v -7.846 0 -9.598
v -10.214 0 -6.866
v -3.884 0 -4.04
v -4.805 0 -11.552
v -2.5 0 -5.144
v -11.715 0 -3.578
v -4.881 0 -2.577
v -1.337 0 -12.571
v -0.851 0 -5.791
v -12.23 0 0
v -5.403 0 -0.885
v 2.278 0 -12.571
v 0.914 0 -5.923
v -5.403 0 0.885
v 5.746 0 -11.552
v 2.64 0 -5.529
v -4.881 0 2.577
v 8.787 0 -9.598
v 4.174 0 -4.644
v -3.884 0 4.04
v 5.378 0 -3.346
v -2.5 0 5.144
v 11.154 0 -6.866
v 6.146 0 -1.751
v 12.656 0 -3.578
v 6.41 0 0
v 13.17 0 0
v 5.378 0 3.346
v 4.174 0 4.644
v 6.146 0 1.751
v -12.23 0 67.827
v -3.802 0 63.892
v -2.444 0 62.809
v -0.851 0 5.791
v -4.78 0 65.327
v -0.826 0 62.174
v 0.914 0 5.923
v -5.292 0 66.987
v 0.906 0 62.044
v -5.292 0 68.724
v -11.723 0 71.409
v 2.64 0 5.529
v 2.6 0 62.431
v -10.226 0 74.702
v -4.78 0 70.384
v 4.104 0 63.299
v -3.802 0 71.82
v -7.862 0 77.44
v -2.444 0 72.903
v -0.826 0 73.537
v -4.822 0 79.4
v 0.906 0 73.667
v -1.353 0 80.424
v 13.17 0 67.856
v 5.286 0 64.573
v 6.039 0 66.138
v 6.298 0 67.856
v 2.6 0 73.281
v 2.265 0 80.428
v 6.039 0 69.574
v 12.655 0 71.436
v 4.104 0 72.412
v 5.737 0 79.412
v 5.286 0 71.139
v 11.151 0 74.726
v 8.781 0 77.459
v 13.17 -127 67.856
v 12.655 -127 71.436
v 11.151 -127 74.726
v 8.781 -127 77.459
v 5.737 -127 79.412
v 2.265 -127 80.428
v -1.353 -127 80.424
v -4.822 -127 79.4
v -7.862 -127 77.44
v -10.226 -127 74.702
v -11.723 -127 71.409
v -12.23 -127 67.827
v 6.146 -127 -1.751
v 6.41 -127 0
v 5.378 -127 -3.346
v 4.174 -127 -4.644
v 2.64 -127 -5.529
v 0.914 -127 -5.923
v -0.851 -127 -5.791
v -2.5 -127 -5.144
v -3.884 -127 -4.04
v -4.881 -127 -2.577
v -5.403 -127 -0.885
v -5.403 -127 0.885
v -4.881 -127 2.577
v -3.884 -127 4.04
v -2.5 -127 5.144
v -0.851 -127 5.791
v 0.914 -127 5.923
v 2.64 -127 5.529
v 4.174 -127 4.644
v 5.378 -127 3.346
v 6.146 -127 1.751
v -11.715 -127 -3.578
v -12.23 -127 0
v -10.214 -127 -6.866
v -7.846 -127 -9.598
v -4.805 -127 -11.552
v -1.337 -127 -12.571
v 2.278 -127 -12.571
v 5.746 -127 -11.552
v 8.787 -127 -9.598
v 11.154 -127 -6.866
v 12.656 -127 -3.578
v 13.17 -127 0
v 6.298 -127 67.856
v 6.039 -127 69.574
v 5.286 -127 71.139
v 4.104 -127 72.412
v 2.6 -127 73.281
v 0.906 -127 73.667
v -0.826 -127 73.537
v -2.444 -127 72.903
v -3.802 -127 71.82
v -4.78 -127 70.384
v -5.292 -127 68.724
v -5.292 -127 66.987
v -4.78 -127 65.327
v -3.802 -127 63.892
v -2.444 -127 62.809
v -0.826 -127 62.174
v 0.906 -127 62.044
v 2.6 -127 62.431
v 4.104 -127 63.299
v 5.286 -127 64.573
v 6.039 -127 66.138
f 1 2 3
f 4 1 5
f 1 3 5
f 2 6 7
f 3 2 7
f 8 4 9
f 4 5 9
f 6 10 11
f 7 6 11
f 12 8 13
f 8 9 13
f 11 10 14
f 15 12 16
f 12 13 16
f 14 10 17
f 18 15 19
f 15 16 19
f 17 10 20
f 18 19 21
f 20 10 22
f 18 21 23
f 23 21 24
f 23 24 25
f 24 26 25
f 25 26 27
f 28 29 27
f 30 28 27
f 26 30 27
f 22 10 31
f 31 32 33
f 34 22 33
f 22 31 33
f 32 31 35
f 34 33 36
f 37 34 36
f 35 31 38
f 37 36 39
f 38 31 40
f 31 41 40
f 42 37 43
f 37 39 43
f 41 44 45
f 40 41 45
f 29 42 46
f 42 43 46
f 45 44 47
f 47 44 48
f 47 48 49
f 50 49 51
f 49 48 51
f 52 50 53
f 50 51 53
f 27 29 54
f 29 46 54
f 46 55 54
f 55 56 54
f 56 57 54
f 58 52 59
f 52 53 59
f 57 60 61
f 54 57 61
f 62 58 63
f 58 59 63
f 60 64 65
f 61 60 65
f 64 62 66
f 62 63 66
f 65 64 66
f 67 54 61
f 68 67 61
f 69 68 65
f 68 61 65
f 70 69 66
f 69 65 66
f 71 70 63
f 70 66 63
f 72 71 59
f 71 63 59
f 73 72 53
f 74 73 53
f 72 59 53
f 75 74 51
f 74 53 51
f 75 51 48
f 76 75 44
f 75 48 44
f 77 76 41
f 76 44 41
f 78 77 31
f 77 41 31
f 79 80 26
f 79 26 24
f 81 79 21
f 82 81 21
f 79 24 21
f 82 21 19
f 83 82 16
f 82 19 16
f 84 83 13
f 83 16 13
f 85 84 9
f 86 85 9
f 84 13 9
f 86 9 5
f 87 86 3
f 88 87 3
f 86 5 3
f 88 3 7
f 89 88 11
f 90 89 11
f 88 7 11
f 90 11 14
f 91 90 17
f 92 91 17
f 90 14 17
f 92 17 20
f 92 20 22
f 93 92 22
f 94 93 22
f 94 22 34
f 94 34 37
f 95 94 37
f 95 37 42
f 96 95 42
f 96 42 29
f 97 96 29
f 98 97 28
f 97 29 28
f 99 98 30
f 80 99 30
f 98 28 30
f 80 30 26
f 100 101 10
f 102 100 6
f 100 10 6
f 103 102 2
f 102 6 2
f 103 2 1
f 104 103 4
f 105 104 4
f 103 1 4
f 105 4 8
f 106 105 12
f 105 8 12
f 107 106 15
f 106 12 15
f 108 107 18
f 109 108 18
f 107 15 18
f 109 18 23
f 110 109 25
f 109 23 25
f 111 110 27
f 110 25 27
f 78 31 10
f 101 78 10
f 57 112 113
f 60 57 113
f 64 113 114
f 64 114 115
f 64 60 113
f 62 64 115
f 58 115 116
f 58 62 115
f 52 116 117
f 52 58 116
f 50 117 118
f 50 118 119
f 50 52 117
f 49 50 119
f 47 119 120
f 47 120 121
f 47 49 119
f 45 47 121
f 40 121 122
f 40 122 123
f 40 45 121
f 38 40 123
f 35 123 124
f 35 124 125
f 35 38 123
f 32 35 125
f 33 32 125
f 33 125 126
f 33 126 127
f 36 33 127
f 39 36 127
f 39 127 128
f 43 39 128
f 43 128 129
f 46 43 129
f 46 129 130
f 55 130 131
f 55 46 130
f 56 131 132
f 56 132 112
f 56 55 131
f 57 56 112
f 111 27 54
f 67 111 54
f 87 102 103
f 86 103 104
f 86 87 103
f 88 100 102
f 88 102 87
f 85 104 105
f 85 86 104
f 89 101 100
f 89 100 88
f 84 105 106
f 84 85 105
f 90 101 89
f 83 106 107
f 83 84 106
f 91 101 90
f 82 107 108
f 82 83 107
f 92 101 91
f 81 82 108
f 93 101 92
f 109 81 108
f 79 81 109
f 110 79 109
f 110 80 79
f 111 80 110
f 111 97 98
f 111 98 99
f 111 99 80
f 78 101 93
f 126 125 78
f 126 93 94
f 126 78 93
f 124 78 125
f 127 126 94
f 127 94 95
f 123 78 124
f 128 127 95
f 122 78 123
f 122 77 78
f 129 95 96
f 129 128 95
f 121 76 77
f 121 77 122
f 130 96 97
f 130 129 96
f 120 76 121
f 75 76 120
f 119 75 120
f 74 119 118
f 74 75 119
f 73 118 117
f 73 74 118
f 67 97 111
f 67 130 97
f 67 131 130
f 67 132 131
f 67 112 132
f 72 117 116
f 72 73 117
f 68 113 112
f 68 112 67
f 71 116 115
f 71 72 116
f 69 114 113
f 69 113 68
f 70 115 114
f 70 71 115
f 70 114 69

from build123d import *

# Parameters (mm, degrees)
F0_R     = 5.827895928
F1_DEPTH = 127


with BuildPart() as f1:
    # F0 (on Front) → F1 (new body)
    with BuildSketch(Plane.XZ):
        with BuildLine():
            ThreePointArc((-5.4695284326, 0), (0.470370132, 5.9398985646), (6.4102686966, 0))
            Line((6.4102686966, 0), (13.170370132, 0))
            Line((13.170370132, 0), (13.170370132, 67.8557001903))
            ThreePointArc((13.170370132, 67.8557001903), (0.4559546677, 80.5557083531), (-12.229629868, 67.8269019314))
            Line((-12.229629868, 67.8269019314), (-12.229629868, 0))
            Line((-12.229629868, 0), (-5.4695284326, 0))
        make_face()
        with Locations((0.4703538064, 67.8557001903)):
            Circle(F0_R, mode=Mode.SUBTRACT)
        with BuildLine():
            Line((13.170370132, 0), (6.4102686966, 0))
            ThreePointArc((6.4102686966, 0), (0.470370132, -5.9398985646), (-5.4695284326, 0))
            Line((-5.4695284326, 0), (-12.229629868, 0))
            ThreePointArc((-12.229629868, 0), (0.470370132, -12.7), (13.170370132, 0))
        make_face()
    extrude(amount=F1_DEPTH)


solid = f1.part
